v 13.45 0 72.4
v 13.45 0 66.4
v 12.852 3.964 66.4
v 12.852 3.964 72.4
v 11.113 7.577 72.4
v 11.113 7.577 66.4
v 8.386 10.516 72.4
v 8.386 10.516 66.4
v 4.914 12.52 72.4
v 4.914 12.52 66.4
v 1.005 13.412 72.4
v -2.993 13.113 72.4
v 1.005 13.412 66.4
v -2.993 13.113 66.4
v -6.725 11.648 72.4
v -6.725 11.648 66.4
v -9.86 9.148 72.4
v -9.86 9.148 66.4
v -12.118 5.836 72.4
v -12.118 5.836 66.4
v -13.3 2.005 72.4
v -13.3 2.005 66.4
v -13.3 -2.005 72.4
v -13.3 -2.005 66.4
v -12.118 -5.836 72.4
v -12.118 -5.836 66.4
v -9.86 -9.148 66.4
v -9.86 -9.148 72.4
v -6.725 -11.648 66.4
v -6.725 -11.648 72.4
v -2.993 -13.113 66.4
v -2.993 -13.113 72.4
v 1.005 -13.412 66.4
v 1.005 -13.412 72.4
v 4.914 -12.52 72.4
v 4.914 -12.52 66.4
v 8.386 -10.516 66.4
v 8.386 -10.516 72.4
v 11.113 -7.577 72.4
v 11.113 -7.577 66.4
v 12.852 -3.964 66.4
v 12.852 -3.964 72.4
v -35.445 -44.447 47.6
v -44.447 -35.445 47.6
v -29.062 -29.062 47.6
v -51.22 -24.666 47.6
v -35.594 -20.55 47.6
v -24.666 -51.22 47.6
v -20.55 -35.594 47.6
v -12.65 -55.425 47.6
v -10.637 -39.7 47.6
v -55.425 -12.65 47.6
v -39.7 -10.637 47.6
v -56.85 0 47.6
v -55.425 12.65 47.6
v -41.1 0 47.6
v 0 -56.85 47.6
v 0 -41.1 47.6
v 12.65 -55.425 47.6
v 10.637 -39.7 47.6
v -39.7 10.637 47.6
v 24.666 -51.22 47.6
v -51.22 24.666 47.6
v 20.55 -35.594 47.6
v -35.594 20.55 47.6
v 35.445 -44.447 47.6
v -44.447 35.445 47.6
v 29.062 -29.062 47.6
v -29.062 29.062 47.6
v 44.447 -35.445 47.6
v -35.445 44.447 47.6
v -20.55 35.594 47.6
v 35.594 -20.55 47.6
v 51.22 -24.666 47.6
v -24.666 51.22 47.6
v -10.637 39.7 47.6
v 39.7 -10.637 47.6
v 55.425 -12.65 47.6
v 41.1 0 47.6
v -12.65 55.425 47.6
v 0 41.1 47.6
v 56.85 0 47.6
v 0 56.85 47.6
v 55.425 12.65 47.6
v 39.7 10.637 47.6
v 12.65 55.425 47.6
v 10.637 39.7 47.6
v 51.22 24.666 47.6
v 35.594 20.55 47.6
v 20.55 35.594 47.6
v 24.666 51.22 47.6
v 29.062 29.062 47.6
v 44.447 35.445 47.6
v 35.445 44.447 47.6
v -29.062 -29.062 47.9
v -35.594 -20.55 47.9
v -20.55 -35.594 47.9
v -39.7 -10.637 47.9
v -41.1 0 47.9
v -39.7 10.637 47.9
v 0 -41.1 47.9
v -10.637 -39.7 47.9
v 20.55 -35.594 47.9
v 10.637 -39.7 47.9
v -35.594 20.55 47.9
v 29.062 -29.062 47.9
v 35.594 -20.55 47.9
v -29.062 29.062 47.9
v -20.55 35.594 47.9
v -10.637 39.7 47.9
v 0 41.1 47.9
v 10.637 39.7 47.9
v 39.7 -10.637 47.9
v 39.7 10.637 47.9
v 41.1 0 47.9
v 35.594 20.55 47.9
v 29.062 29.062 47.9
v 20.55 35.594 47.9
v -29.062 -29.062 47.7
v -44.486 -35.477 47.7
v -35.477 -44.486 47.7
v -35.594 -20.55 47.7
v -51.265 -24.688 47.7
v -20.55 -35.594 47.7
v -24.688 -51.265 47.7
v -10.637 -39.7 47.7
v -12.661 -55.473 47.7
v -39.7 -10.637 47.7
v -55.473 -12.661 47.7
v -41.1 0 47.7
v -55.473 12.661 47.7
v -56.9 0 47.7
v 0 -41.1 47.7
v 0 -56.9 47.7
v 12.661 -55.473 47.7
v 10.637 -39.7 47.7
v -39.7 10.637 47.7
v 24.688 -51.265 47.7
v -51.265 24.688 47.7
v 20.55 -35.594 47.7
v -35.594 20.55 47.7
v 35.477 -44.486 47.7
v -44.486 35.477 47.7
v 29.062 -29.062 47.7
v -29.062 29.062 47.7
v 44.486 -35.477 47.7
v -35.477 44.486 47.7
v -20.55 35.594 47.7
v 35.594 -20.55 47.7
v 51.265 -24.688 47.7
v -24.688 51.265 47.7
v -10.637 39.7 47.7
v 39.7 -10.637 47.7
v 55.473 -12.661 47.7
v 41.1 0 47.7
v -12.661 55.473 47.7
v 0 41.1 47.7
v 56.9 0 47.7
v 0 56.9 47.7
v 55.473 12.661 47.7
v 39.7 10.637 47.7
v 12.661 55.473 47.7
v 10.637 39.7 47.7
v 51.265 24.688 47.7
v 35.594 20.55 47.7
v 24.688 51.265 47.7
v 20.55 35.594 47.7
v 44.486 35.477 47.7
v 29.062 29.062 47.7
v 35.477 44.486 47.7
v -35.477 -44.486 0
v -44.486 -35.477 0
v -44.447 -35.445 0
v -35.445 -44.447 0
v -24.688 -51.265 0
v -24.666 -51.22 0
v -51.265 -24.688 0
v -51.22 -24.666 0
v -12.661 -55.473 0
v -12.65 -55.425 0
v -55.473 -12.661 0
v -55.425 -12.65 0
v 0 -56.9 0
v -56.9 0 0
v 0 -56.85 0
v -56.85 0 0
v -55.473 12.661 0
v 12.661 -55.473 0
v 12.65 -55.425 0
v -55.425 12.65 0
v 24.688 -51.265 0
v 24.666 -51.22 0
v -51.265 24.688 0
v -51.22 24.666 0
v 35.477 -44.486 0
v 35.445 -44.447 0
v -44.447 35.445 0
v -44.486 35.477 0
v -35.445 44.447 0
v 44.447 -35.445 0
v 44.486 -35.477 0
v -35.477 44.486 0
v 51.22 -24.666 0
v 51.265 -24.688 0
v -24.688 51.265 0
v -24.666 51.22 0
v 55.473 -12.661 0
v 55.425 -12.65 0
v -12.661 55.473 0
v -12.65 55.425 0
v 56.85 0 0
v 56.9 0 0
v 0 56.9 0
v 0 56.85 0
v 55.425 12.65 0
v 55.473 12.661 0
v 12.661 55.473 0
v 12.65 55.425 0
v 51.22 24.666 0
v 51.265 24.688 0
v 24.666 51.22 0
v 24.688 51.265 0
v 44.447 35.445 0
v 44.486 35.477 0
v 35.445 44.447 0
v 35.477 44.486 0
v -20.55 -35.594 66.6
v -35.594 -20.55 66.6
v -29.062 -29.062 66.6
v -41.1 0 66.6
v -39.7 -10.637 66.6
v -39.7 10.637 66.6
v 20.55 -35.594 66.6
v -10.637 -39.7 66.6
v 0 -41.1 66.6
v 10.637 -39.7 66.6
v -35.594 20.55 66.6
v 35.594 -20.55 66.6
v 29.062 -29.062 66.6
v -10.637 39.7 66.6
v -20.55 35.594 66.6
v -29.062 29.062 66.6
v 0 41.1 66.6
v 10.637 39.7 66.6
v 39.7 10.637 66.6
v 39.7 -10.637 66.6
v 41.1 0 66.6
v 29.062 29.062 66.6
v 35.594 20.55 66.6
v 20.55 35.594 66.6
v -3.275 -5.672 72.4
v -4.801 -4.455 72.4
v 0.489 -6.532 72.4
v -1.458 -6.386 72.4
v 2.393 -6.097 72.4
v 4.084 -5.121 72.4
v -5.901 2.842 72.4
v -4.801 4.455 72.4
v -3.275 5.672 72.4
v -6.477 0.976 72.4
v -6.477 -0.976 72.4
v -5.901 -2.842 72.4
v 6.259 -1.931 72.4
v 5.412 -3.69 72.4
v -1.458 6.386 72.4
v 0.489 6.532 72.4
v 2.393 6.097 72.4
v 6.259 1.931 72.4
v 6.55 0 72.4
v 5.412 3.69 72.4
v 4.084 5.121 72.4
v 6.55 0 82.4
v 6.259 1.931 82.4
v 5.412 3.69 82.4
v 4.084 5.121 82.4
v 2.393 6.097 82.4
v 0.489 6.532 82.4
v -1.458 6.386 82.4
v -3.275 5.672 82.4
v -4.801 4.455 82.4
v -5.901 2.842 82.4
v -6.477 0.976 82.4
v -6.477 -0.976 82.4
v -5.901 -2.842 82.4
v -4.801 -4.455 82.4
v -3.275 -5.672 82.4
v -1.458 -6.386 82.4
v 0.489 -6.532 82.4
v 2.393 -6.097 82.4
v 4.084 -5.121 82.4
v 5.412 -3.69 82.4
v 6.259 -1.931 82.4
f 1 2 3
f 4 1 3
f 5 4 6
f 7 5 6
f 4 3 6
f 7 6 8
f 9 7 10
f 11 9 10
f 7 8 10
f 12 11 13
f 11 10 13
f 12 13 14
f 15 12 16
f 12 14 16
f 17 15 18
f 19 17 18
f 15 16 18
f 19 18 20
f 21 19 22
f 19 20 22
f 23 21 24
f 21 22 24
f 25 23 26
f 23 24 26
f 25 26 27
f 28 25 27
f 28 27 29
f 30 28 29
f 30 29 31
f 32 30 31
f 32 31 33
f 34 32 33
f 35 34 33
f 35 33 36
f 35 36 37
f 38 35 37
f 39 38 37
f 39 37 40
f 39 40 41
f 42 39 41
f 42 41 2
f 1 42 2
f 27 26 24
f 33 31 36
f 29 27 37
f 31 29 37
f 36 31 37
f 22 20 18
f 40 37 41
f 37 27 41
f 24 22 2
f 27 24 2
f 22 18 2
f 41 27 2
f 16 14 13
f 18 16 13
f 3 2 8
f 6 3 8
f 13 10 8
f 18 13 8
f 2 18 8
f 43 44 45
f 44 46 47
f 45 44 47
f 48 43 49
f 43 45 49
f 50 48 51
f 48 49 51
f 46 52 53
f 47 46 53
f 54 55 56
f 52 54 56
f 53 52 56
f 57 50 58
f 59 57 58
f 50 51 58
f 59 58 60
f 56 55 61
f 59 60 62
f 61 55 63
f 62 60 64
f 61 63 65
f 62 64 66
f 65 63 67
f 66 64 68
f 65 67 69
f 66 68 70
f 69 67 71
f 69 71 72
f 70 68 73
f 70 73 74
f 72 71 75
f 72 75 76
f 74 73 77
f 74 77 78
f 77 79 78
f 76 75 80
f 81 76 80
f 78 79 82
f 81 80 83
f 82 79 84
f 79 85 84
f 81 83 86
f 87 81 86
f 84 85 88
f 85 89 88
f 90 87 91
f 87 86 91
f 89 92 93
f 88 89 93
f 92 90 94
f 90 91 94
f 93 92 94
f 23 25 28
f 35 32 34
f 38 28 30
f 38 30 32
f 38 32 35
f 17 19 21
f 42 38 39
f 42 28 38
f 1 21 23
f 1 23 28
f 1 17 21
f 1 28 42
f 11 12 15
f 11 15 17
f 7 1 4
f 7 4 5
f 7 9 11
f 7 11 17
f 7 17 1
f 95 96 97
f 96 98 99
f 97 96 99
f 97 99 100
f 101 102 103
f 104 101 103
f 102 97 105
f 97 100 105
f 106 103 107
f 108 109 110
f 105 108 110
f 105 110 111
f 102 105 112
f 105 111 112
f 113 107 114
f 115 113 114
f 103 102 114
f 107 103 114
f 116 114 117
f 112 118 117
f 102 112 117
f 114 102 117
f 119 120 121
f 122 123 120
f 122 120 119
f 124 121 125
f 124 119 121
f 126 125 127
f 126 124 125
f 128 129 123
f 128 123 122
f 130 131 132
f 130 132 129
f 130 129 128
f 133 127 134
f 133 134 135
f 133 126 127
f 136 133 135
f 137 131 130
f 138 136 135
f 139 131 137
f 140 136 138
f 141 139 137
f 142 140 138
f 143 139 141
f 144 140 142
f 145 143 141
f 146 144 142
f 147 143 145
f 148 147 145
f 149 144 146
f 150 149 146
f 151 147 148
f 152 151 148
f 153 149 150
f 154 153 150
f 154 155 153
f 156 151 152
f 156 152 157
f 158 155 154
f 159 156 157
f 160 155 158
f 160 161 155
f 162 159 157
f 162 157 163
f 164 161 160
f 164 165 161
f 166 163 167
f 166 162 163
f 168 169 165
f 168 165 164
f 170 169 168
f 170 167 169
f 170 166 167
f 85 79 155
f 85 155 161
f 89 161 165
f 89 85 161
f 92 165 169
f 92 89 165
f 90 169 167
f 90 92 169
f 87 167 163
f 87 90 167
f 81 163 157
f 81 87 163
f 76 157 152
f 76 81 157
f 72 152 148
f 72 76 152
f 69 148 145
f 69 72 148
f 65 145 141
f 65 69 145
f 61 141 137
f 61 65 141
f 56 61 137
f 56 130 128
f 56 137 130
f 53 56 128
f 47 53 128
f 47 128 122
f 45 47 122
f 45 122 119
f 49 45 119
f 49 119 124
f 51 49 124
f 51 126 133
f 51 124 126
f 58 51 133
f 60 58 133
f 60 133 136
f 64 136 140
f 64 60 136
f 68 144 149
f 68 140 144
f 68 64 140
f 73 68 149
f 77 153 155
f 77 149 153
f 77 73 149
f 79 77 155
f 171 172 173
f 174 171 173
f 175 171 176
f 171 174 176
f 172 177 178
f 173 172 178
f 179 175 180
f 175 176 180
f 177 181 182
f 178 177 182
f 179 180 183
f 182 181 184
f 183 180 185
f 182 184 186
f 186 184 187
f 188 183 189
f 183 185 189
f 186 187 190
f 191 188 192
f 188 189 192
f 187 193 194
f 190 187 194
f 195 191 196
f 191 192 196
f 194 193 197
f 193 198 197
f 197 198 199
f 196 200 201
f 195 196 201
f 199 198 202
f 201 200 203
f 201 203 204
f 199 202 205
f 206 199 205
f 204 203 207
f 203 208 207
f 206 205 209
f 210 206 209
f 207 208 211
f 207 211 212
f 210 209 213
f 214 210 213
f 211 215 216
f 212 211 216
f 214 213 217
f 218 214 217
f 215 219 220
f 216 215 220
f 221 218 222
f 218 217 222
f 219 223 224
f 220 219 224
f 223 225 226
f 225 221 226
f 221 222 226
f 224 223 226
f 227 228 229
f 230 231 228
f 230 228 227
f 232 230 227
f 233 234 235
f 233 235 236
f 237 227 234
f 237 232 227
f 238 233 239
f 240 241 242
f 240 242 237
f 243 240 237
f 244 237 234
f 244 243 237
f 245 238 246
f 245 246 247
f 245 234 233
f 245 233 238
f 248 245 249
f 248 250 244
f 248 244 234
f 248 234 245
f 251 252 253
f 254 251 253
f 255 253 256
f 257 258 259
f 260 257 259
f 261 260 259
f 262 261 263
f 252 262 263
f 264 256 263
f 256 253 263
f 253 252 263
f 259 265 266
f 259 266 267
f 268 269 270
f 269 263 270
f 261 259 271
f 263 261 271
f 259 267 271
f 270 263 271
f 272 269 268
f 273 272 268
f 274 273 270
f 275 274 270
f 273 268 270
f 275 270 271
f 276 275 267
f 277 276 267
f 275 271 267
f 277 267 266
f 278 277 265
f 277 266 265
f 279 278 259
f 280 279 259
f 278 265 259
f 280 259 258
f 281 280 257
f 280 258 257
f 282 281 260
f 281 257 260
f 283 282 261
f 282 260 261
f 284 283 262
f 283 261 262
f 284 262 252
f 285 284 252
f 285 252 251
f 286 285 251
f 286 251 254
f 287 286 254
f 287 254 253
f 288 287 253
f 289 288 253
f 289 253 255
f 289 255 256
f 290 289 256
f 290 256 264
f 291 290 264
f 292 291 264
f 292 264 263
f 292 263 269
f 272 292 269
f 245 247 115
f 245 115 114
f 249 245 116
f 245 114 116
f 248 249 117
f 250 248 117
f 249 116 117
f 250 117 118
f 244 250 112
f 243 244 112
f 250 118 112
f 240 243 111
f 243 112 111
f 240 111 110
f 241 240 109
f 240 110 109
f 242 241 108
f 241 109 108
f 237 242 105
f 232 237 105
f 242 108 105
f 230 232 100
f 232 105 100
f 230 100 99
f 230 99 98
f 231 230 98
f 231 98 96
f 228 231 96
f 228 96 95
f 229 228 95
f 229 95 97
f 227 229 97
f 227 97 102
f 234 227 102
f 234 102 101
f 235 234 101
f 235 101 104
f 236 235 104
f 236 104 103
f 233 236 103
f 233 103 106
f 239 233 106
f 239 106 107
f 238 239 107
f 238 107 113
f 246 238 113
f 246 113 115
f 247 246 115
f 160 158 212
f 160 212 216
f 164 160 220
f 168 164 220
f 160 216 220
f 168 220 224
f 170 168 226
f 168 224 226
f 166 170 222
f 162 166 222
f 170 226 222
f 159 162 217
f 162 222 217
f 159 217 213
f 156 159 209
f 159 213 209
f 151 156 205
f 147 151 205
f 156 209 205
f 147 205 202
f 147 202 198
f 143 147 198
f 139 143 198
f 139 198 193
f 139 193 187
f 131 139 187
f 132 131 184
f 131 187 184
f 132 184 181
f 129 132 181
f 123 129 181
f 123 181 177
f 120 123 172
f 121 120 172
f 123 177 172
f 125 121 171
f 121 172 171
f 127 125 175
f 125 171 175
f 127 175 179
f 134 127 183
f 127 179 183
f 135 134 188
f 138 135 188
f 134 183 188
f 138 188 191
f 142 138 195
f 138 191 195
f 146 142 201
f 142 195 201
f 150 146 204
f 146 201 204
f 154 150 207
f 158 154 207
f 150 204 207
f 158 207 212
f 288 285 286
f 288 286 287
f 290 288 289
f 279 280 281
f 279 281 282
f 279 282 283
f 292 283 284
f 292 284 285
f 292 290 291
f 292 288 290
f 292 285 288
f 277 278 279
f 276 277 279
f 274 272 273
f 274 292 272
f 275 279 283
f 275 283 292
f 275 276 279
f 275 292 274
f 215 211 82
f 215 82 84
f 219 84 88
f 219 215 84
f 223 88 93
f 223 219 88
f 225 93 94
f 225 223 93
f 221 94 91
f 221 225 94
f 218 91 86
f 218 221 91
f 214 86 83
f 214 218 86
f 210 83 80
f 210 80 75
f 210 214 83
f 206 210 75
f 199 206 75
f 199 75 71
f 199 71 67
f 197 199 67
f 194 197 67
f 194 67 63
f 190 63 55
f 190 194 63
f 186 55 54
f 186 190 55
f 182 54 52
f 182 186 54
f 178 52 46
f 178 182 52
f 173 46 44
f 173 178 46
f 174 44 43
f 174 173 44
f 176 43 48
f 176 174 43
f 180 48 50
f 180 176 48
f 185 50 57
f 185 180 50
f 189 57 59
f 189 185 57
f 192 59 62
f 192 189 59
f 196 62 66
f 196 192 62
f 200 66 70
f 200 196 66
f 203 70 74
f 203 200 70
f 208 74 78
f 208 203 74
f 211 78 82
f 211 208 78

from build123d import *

# Parameters (mm, degrees)
F0_R      = 56.9
F1_DEPTH  = 47.7
F2_R      = 56.85
F3_DEPTH  = 47.6
F4_R      = 41.1
F5_DEPTH  = 66.6
F6_DEPTH  = 47.9
F7_R      = 13.45
F8_DEPTH  = 72.4
F9_DEPTH  = 66.4
F10_R     = 6.55
F11_DEPTH = 82.4
F12_DEPTH = 72.4


with BuildPart() as f1:
    # F0 (on Top) → F1 (new body)
    with BuildSketch(Plane.XY):
        Circle(F0_R)
    extrude(amount=F1_DEPTH)

    # F2 (on Top) → F3 (cut)
    with BuildSketch(Plane.XY):
        Circle(F2_R)
    extrude(amount=F3_DEPTH, mode=Mode.SUBTRACT)


with BuildPart() as f5:
    # F4 (on Top) → F5 (new body)
    with BuildSketch(Plane.XY):
        Circle(F4_R)
    extrude(amount=F5_DEPTH)


with BuildPart() as f6_tool:
    # F4 (on Top) → F6 (new body)
    with BuildSketch(Plane.XY):
        Circle(F4_R)
    extrude(amount=F6_DEPTH)


with BuildPart() as f1_1:
    add(f1.part)

    # F6: cut by f6_tool
    add(f6_tool.part, mode=Mode.SUBTRACT)


with BuildPart() as f5_1:
    add(f5.part)

    # F6: cut by f6_tool
    add(f6_tool.part, mode=Mode.SUBTRACT)


with BuildPart() as f8:
    # F7 (on Top) → F8 (new body)
    with BuildSketch(Plane.XY):
        Circle(F7_R)
    extrude(amount=F8_DEPTH)

    # F7 (on Top) → F9 (cut)
    with BuildSketch(Plane.XY):
        Circle(F7_R)
    extrude(amount=F9_DEPTH, mode=Mode.SUBTRACT)


with BuildPart() as f11:
    # F10 (on Top) → F11 (new body)
    with BuildSketch(Plane.XY):
        Circle(F10_R)
    extrude(amount=F11_DEPTH)

    # F10 (on Top) → F12 (cut)
    with BuildSketch(Plane.XY):
        Circle(F10_R)
    extrude(amount=F12_DEPTH, mode=Mode.SUBTRACT)


solid = Compound([f1_1.part, f5_1.part, f8.part, f11.part])
